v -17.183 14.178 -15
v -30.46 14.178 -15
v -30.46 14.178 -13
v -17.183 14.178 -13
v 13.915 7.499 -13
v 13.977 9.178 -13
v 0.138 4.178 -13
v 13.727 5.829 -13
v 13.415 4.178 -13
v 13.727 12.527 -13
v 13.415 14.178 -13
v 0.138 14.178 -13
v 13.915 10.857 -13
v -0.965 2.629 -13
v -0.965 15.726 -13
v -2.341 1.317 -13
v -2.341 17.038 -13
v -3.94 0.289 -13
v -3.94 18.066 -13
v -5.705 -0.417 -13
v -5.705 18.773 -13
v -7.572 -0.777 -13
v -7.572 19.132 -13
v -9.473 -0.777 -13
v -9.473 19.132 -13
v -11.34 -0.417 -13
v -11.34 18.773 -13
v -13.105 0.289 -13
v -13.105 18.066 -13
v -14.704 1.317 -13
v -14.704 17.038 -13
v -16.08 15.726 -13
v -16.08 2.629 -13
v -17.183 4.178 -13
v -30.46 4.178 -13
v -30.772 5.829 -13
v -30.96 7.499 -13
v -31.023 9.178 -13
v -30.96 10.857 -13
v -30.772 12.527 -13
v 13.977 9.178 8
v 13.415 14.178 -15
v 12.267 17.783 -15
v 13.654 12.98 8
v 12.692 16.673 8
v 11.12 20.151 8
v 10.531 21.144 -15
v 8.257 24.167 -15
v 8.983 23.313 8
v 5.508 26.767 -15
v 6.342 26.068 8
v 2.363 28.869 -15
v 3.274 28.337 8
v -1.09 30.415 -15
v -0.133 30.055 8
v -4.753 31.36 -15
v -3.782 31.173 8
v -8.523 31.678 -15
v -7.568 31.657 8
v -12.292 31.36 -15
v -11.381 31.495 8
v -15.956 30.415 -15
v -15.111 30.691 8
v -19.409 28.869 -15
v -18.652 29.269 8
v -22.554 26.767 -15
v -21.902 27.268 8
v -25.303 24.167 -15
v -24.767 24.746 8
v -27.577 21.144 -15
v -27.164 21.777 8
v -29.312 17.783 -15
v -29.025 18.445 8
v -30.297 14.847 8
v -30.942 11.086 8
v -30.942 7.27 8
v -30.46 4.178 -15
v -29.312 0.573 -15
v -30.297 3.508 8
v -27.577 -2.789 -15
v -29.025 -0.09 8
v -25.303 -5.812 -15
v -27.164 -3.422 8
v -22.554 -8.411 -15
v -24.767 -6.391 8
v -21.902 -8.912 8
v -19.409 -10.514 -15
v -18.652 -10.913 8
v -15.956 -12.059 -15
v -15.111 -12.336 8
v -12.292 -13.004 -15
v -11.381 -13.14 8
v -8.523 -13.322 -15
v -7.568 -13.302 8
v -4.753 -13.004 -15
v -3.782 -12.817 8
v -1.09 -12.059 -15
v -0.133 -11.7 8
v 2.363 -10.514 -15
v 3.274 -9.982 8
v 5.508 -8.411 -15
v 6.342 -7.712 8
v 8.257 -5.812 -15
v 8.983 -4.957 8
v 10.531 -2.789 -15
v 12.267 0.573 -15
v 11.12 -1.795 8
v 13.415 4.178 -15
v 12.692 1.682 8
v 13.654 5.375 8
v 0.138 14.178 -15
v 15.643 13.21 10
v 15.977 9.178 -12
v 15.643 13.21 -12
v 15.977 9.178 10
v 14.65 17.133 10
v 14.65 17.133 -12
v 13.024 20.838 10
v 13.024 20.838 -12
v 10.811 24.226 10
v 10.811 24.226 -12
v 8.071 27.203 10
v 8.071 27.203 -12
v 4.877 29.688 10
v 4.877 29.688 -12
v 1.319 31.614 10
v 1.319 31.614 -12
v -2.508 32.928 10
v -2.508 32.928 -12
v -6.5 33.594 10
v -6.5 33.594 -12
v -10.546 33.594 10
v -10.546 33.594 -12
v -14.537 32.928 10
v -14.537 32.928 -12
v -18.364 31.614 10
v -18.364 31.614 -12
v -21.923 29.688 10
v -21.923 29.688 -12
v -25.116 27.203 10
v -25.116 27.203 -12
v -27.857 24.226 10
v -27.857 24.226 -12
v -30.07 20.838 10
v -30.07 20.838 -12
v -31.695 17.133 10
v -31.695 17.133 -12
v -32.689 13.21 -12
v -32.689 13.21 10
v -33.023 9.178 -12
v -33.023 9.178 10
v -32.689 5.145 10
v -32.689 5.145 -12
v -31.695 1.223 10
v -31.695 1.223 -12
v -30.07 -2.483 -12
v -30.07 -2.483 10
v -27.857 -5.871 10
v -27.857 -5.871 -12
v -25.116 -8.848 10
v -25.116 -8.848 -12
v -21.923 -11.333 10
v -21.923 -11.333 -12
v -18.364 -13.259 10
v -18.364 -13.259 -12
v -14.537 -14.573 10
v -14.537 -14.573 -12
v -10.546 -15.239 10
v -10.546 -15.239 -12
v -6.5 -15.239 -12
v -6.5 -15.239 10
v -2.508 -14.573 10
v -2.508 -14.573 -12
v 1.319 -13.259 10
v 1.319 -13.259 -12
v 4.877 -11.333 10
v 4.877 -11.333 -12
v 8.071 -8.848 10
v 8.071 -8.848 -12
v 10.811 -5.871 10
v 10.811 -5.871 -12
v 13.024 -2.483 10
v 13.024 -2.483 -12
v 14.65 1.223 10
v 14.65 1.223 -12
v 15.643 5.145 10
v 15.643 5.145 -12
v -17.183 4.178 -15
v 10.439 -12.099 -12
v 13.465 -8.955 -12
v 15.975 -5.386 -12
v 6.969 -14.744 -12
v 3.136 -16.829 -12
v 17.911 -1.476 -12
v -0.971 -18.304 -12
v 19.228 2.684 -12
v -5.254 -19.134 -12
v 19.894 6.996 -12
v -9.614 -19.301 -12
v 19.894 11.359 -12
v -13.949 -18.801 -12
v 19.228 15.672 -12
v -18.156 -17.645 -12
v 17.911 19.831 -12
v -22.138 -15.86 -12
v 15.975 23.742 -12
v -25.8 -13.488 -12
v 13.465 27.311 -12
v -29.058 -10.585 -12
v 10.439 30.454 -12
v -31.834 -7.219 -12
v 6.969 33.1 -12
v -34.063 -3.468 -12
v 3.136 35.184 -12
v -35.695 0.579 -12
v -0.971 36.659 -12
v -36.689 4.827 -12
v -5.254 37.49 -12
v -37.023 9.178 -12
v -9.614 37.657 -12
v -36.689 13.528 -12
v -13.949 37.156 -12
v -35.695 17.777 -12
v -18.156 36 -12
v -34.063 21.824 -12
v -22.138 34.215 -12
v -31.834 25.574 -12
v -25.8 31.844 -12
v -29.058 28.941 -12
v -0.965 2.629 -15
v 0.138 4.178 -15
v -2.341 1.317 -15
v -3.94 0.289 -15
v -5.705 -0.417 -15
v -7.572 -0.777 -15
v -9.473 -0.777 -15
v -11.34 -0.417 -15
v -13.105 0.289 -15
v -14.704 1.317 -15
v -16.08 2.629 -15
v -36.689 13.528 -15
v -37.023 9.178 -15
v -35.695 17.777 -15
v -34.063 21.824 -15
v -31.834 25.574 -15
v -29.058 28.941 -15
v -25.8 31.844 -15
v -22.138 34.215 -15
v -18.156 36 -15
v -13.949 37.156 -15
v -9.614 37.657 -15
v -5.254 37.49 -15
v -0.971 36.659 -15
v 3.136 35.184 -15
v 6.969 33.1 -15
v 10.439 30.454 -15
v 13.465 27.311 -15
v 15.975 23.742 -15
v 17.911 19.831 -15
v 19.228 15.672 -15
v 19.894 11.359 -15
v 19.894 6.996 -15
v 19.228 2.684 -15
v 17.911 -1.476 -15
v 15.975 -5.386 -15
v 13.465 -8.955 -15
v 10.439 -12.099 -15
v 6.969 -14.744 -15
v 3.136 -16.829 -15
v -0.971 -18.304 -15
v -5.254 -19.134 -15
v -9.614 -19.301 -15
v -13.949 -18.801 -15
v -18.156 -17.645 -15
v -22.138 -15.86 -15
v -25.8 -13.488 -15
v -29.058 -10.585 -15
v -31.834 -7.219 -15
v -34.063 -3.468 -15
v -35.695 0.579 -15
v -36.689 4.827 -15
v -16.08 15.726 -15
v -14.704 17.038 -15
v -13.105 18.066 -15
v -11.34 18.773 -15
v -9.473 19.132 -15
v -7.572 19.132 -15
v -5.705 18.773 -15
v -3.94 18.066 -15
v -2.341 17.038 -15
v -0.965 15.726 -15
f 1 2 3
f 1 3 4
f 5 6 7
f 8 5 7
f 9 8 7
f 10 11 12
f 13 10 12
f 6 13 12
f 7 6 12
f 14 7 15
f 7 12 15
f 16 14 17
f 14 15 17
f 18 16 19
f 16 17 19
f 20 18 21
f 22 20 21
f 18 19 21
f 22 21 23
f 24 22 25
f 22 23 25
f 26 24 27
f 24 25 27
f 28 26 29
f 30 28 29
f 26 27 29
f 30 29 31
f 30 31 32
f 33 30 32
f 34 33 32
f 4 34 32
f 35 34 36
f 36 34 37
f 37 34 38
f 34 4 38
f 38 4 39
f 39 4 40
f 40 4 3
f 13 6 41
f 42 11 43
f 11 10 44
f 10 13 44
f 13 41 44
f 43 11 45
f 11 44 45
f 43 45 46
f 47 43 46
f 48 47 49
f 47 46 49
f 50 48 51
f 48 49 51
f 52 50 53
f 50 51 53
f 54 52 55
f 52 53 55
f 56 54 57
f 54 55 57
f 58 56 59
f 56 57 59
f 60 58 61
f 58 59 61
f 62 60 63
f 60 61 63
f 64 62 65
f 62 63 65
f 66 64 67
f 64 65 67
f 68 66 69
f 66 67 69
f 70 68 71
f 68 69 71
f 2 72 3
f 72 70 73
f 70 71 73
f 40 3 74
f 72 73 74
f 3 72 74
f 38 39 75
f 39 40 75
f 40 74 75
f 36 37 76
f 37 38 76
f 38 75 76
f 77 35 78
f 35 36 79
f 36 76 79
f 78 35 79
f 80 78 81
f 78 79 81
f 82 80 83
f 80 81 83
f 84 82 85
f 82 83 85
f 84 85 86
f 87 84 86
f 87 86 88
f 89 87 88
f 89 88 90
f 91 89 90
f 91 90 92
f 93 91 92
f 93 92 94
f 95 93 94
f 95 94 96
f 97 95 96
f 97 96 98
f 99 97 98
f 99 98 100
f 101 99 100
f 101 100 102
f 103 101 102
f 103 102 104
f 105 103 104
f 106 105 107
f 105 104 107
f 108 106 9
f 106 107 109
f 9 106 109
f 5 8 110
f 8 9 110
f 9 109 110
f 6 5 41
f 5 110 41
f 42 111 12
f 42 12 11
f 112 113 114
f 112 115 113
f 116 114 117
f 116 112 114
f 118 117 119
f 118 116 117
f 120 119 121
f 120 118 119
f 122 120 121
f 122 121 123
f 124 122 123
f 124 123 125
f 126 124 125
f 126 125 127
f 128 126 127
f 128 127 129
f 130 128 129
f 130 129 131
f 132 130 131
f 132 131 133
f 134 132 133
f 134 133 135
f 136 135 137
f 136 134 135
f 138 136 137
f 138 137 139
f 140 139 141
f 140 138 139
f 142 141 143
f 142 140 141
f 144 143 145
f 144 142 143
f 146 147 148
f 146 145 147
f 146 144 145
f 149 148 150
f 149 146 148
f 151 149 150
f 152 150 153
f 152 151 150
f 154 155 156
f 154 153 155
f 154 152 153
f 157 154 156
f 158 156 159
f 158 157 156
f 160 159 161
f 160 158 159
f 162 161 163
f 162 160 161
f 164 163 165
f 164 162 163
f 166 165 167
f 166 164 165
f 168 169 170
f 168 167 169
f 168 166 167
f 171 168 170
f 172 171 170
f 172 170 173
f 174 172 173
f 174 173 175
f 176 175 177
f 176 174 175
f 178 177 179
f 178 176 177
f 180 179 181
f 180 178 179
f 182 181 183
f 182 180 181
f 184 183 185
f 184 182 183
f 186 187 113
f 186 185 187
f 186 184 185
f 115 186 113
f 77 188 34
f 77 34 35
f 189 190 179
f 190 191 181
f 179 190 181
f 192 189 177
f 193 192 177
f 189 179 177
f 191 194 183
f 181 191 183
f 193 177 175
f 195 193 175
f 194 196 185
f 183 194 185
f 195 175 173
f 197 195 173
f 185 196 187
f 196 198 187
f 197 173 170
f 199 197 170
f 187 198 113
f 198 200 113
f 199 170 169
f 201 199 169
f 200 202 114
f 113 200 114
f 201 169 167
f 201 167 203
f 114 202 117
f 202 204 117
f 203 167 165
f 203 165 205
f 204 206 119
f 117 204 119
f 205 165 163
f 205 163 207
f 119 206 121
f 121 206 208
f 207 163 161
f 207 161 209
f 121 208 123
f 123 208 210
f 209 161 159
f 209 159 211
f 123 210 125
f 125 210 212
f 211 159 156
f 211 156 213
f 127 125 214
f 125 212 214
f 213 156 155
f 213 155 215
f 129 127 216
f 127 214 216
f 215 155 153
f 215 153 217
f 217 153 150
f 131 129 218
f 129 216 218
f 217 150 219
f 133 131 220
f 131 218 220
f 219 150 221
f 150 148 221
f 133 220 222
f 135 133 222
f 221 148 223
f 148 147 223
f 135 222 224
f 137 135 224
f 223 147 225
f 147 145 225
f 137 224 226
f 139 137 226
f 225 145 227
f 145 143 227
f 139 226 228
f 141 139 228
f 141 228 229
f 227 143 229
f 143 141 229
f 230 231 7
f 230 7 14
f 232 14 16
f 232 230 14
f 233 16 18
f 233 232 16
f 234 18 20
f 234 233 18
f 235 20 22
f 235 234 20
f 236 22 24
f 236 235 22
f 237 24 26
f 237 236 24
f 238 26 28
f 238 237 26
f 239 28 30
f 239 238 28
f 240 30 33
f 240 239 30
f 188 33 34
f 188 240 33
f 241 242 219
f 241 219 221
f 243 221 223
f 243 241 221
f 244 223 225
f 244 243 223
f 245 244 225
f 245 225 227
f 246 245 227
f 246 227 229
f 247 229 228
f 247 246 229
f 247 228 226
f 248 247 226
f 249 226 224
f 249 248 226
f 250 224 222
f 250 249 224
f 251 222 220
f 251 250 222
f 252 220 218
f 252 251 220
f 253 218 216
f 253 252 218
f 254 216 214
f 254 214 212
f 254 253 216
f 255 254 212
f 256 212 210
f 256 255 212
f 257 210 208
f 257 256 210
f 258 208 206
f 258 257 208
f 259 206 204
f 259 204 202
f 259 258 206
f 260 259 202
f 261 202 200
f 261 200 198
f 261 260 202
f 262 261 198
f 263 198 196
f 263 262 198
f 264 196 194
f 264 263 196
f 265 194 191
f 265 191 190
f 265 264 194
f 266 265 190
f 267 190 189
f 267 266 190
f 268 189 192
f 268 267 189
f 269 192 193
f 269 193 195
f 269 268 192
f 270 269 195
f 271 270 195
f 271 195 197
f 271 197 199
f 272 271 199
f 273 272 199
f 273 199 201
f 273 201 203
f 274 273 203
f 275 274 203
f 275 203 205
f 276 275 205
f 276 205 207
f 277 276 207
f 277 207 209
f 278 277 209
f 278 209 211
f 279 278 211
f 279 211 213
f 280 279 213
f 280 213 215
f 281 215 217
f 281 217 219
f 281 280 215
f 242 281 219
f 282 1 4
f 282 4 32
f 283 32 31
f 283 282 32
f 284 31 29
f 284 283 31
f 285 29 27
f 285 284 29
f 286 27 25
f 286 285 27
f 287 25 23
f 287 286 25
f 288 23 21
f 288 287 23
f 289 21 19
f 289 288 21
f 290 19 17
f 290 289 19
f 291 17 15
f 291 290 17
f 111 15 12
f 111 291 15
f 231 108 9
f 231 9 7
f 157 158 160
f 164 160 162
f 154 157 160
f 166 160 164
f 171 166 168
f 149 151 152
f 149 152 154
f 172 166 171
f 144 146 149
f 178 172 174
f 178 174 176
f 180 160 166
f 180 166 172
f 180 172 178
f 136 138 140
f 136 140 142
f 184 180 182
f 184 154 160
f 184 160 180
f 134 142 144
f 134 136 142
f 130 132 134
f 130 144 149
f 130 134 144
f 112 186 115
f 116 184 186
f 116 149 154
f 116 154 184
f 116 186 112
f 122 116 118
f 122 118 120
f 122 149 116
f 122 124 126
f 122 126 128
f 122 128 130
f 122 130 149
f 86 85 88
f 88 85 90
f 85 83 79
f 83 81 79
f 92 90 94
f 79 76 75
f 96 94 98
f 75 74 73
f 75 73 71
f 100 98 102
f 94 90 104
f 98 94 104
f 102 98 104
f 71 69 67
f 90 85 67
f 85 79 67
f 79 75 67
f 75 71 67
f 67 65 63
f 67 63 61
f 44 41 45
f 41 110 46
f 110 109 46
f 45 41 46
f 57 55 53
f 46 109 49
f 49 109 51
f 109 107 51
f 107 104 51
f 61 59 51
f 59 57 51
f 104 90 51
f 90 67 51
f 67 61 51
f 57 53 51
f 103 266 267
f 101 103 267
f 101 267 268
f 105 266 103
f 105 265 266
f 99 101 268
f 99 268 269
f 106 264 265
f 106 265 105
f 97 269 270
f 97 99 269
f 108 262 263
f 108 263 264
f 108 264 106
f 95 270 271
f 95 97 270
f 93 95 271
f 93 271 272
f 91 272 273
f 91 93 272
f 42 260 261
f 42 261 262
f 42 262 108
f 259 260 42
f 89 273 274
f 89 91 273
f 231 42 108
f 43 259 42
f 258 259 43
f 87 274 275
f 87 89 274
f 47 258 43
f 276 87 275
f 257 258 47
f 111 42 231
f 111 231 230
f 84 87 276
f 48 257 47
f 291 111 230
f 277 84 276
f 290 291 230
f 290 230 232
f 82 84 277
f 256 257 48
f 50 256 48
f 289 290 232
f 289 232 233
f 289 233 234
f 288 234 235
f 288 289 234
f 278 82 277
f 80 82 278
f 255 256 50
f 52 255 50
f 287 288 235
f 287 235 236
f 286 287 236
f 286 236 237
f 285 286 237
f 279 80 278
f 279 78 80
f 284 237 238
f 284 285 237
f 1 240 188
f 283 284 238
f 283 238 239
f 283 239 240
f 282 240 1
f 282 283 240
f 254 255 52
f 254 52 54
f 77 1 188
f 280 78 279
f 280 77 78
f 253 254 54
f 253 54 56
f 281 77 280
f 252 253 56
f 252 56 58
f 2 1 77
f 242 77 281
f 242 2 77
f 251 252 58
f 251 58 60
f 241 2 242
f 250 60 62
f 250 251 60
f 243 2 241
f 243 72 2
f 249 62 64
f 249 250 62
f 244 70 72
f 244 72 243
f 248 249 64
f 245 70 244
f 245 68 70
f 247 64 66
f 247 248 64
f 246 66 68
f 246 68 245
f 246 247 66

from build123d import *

# Parameters (mm, degrees)
SKETCH1_R                = 24.5
SKETCH1_R_2              = 22.5
BOSS_EXTRUDE1_DEPTH      = 10
BOSS_EXTRUDE1_DEPTH_BACK = 15
SKETCH2_R                = 22.735866394
BOSS_EXTRUDE2_DEPTH      = 2
BOSS_EXTRUDE3_DEPTH      = 2
SKETCH4_R                = 28.5
SKETCH4_R_2              = 24.5
BOSS_EXTRUDE4_DEPTH      = 3


with BuildPart() as part:
    # Sketch1 → Boss-Extrude1 (new body, two sides)
    with BuildSketch(Plane.XY) as boss_extrude1_sk:
        with Locations((-8.522732981, 9.177701176)):
            Circle(SKETCH1_R)
        with Locations((-8.522732981, 9.177701176)):
            Circle(SKETCH1_R_2, mode=Mode.SUBTRACT)
    extrude(amount=BOSS_EXTRUDE1_DEPTH)
    extrude(boss_extrude1_sk.sketch, amount=-BOSS_EXTRUDE1_DEPTH_BACK)

    # Sketch2 → Boss-Extrude2 (add)
    with BuildSketch(Plane.XY.offset(10)):
        with Locations((-8.522732981, 9.177701176)):
            Circle(SKETCH2_R)
    extrude(amount=-BOSS_EXTRUDE2_DEPTH)

    # Sketch3 → Boss-Extrude3 (add)
    with BuildSketch(Plane(origin=(0, 0, -15), x_dir=(-1, 0, 0), z_dir=(0, 0, -1))):
        with BuildLine():
            Line((30.460143949, 14.177701176), (17.182987019, 14.177701176))
            ThreePointArc((17.182987019, 14.177701176), (18.181991244, 11.765891627), (18.522732981, 9.177701176))
            ThreePointArc((18.522732981, 9.177701176), (18.181991244, 6.589510725), (17.182987019, 4.177701176))
            Line((17.182987019, 4.177701176), (30.460143949, 4.177701176))
            ThreePointArc((30.460143949, 4.177701176), (30.881643361, 6.661925629), (31.022732981, 9.177701176))
            ThreePointArc((31.022732981, 9.177701176), (30.881643361, 11.693476723), (30.460143949, 14.177701176))
        make_face()
        with BuildLine():
            Line((17.182987019, 14.177701176), (16.522732981, 14.177701176))
            Line((16.522732981, 14.177701176), (16.522732981, 4.177701176))
            Line((16.522732981, 4.177701176), (17.182987019, 4.177701176))
            ThreePointArc((17.182987019, 4.177701176), (18.181991244, 6.589510725), (18.522732981, 9.177701176))
            ThreePointArc((18.522732981, 9.177701176), (18.181991244, 11.765891627), (17.182987019, 14.177701176))
        make_face()
        with BuildLine():
            Line((16.522732981, 4.177701176), (16.522732981, 14.177701176))
            Line((16.522732981, 14.177701176), (17.182987019, 14.177701176))
            ThreePointArc((17.182987019, 14.177701176), (8.522732981, 19.177701176), (-0.137521057, 14.177701176))
            Line((-0.137521057, 14.177701176), (0.522732981, 14.177701176))
            Line((0.522732981, 14.177701176), (0.522732981, 4.177701176))
            Line((0.522732981, 4.177701176), (-0.137521057, 4.177701176))
            ThreePointArc((-0.137521057, 4.177701176), (8.522732981, -0.822298824), (17.182987019, 4.177701176))
            Line((17.182987019, 4.177701176), (16.522732981, 4.177701176))
        make_face()
        with BuildLine():
            Line((0.522732981, 14.177701176), (-0.137521057, 14.177701176))
            ThreePointArc((-0.137521057, 14.177701176), (-1.477267019, 9.177701176), (-0.137521057, 4.177701176))
            Line((-0.137521057, 4.177701176), (0.522732981, 4.177701176))
            Line((0.522732981, 4.177701176), (0.522732981, 14.177701176))
        make_face()
        with BuildLine():
            ThreePointArc((-0.137521057, 4.177701176), (-1.477267019, 9.177701176), (-0.137521057, 14.177701176))
            Line((-0.137521057, 14.177701176), (-13.414677988, 14.177701176))
            ThreePointArc((-13.414677988, 14.177701176), (-13.836177399, 11.693476723), (-13.977267019, 9.177701176))
            ThreePointArc((-13.977267019, 9.177701176), (-13.836177399, 6.661925629), (-13.414677988, 4.177701176))
            Line((-13.414677988, 4.177701176), (-0.137521057, 4.177701176))
        make_face()
    extrude(amount=-BOSS_EXTRUDE3_DEPTH)

    # Sketch4 → Boss-Extrude4 (add)
    with BuildSketch(Plane(origin=(0, 0, -15), x_dir=(-1, 0, 0), z_dir=(0, 0, -1))):
        with Locations((8.522732981, 9.177701176)):
            Circle(SKETCH4_R)
        with Locations((8.522732981, 9.177701176)):
            Circle(SKETCH4_R_2, mode=Mode.SUBTRACT)
    extrude(amount=-BOSS_EXTRUDE4_DEPTH)


solid = part.part
